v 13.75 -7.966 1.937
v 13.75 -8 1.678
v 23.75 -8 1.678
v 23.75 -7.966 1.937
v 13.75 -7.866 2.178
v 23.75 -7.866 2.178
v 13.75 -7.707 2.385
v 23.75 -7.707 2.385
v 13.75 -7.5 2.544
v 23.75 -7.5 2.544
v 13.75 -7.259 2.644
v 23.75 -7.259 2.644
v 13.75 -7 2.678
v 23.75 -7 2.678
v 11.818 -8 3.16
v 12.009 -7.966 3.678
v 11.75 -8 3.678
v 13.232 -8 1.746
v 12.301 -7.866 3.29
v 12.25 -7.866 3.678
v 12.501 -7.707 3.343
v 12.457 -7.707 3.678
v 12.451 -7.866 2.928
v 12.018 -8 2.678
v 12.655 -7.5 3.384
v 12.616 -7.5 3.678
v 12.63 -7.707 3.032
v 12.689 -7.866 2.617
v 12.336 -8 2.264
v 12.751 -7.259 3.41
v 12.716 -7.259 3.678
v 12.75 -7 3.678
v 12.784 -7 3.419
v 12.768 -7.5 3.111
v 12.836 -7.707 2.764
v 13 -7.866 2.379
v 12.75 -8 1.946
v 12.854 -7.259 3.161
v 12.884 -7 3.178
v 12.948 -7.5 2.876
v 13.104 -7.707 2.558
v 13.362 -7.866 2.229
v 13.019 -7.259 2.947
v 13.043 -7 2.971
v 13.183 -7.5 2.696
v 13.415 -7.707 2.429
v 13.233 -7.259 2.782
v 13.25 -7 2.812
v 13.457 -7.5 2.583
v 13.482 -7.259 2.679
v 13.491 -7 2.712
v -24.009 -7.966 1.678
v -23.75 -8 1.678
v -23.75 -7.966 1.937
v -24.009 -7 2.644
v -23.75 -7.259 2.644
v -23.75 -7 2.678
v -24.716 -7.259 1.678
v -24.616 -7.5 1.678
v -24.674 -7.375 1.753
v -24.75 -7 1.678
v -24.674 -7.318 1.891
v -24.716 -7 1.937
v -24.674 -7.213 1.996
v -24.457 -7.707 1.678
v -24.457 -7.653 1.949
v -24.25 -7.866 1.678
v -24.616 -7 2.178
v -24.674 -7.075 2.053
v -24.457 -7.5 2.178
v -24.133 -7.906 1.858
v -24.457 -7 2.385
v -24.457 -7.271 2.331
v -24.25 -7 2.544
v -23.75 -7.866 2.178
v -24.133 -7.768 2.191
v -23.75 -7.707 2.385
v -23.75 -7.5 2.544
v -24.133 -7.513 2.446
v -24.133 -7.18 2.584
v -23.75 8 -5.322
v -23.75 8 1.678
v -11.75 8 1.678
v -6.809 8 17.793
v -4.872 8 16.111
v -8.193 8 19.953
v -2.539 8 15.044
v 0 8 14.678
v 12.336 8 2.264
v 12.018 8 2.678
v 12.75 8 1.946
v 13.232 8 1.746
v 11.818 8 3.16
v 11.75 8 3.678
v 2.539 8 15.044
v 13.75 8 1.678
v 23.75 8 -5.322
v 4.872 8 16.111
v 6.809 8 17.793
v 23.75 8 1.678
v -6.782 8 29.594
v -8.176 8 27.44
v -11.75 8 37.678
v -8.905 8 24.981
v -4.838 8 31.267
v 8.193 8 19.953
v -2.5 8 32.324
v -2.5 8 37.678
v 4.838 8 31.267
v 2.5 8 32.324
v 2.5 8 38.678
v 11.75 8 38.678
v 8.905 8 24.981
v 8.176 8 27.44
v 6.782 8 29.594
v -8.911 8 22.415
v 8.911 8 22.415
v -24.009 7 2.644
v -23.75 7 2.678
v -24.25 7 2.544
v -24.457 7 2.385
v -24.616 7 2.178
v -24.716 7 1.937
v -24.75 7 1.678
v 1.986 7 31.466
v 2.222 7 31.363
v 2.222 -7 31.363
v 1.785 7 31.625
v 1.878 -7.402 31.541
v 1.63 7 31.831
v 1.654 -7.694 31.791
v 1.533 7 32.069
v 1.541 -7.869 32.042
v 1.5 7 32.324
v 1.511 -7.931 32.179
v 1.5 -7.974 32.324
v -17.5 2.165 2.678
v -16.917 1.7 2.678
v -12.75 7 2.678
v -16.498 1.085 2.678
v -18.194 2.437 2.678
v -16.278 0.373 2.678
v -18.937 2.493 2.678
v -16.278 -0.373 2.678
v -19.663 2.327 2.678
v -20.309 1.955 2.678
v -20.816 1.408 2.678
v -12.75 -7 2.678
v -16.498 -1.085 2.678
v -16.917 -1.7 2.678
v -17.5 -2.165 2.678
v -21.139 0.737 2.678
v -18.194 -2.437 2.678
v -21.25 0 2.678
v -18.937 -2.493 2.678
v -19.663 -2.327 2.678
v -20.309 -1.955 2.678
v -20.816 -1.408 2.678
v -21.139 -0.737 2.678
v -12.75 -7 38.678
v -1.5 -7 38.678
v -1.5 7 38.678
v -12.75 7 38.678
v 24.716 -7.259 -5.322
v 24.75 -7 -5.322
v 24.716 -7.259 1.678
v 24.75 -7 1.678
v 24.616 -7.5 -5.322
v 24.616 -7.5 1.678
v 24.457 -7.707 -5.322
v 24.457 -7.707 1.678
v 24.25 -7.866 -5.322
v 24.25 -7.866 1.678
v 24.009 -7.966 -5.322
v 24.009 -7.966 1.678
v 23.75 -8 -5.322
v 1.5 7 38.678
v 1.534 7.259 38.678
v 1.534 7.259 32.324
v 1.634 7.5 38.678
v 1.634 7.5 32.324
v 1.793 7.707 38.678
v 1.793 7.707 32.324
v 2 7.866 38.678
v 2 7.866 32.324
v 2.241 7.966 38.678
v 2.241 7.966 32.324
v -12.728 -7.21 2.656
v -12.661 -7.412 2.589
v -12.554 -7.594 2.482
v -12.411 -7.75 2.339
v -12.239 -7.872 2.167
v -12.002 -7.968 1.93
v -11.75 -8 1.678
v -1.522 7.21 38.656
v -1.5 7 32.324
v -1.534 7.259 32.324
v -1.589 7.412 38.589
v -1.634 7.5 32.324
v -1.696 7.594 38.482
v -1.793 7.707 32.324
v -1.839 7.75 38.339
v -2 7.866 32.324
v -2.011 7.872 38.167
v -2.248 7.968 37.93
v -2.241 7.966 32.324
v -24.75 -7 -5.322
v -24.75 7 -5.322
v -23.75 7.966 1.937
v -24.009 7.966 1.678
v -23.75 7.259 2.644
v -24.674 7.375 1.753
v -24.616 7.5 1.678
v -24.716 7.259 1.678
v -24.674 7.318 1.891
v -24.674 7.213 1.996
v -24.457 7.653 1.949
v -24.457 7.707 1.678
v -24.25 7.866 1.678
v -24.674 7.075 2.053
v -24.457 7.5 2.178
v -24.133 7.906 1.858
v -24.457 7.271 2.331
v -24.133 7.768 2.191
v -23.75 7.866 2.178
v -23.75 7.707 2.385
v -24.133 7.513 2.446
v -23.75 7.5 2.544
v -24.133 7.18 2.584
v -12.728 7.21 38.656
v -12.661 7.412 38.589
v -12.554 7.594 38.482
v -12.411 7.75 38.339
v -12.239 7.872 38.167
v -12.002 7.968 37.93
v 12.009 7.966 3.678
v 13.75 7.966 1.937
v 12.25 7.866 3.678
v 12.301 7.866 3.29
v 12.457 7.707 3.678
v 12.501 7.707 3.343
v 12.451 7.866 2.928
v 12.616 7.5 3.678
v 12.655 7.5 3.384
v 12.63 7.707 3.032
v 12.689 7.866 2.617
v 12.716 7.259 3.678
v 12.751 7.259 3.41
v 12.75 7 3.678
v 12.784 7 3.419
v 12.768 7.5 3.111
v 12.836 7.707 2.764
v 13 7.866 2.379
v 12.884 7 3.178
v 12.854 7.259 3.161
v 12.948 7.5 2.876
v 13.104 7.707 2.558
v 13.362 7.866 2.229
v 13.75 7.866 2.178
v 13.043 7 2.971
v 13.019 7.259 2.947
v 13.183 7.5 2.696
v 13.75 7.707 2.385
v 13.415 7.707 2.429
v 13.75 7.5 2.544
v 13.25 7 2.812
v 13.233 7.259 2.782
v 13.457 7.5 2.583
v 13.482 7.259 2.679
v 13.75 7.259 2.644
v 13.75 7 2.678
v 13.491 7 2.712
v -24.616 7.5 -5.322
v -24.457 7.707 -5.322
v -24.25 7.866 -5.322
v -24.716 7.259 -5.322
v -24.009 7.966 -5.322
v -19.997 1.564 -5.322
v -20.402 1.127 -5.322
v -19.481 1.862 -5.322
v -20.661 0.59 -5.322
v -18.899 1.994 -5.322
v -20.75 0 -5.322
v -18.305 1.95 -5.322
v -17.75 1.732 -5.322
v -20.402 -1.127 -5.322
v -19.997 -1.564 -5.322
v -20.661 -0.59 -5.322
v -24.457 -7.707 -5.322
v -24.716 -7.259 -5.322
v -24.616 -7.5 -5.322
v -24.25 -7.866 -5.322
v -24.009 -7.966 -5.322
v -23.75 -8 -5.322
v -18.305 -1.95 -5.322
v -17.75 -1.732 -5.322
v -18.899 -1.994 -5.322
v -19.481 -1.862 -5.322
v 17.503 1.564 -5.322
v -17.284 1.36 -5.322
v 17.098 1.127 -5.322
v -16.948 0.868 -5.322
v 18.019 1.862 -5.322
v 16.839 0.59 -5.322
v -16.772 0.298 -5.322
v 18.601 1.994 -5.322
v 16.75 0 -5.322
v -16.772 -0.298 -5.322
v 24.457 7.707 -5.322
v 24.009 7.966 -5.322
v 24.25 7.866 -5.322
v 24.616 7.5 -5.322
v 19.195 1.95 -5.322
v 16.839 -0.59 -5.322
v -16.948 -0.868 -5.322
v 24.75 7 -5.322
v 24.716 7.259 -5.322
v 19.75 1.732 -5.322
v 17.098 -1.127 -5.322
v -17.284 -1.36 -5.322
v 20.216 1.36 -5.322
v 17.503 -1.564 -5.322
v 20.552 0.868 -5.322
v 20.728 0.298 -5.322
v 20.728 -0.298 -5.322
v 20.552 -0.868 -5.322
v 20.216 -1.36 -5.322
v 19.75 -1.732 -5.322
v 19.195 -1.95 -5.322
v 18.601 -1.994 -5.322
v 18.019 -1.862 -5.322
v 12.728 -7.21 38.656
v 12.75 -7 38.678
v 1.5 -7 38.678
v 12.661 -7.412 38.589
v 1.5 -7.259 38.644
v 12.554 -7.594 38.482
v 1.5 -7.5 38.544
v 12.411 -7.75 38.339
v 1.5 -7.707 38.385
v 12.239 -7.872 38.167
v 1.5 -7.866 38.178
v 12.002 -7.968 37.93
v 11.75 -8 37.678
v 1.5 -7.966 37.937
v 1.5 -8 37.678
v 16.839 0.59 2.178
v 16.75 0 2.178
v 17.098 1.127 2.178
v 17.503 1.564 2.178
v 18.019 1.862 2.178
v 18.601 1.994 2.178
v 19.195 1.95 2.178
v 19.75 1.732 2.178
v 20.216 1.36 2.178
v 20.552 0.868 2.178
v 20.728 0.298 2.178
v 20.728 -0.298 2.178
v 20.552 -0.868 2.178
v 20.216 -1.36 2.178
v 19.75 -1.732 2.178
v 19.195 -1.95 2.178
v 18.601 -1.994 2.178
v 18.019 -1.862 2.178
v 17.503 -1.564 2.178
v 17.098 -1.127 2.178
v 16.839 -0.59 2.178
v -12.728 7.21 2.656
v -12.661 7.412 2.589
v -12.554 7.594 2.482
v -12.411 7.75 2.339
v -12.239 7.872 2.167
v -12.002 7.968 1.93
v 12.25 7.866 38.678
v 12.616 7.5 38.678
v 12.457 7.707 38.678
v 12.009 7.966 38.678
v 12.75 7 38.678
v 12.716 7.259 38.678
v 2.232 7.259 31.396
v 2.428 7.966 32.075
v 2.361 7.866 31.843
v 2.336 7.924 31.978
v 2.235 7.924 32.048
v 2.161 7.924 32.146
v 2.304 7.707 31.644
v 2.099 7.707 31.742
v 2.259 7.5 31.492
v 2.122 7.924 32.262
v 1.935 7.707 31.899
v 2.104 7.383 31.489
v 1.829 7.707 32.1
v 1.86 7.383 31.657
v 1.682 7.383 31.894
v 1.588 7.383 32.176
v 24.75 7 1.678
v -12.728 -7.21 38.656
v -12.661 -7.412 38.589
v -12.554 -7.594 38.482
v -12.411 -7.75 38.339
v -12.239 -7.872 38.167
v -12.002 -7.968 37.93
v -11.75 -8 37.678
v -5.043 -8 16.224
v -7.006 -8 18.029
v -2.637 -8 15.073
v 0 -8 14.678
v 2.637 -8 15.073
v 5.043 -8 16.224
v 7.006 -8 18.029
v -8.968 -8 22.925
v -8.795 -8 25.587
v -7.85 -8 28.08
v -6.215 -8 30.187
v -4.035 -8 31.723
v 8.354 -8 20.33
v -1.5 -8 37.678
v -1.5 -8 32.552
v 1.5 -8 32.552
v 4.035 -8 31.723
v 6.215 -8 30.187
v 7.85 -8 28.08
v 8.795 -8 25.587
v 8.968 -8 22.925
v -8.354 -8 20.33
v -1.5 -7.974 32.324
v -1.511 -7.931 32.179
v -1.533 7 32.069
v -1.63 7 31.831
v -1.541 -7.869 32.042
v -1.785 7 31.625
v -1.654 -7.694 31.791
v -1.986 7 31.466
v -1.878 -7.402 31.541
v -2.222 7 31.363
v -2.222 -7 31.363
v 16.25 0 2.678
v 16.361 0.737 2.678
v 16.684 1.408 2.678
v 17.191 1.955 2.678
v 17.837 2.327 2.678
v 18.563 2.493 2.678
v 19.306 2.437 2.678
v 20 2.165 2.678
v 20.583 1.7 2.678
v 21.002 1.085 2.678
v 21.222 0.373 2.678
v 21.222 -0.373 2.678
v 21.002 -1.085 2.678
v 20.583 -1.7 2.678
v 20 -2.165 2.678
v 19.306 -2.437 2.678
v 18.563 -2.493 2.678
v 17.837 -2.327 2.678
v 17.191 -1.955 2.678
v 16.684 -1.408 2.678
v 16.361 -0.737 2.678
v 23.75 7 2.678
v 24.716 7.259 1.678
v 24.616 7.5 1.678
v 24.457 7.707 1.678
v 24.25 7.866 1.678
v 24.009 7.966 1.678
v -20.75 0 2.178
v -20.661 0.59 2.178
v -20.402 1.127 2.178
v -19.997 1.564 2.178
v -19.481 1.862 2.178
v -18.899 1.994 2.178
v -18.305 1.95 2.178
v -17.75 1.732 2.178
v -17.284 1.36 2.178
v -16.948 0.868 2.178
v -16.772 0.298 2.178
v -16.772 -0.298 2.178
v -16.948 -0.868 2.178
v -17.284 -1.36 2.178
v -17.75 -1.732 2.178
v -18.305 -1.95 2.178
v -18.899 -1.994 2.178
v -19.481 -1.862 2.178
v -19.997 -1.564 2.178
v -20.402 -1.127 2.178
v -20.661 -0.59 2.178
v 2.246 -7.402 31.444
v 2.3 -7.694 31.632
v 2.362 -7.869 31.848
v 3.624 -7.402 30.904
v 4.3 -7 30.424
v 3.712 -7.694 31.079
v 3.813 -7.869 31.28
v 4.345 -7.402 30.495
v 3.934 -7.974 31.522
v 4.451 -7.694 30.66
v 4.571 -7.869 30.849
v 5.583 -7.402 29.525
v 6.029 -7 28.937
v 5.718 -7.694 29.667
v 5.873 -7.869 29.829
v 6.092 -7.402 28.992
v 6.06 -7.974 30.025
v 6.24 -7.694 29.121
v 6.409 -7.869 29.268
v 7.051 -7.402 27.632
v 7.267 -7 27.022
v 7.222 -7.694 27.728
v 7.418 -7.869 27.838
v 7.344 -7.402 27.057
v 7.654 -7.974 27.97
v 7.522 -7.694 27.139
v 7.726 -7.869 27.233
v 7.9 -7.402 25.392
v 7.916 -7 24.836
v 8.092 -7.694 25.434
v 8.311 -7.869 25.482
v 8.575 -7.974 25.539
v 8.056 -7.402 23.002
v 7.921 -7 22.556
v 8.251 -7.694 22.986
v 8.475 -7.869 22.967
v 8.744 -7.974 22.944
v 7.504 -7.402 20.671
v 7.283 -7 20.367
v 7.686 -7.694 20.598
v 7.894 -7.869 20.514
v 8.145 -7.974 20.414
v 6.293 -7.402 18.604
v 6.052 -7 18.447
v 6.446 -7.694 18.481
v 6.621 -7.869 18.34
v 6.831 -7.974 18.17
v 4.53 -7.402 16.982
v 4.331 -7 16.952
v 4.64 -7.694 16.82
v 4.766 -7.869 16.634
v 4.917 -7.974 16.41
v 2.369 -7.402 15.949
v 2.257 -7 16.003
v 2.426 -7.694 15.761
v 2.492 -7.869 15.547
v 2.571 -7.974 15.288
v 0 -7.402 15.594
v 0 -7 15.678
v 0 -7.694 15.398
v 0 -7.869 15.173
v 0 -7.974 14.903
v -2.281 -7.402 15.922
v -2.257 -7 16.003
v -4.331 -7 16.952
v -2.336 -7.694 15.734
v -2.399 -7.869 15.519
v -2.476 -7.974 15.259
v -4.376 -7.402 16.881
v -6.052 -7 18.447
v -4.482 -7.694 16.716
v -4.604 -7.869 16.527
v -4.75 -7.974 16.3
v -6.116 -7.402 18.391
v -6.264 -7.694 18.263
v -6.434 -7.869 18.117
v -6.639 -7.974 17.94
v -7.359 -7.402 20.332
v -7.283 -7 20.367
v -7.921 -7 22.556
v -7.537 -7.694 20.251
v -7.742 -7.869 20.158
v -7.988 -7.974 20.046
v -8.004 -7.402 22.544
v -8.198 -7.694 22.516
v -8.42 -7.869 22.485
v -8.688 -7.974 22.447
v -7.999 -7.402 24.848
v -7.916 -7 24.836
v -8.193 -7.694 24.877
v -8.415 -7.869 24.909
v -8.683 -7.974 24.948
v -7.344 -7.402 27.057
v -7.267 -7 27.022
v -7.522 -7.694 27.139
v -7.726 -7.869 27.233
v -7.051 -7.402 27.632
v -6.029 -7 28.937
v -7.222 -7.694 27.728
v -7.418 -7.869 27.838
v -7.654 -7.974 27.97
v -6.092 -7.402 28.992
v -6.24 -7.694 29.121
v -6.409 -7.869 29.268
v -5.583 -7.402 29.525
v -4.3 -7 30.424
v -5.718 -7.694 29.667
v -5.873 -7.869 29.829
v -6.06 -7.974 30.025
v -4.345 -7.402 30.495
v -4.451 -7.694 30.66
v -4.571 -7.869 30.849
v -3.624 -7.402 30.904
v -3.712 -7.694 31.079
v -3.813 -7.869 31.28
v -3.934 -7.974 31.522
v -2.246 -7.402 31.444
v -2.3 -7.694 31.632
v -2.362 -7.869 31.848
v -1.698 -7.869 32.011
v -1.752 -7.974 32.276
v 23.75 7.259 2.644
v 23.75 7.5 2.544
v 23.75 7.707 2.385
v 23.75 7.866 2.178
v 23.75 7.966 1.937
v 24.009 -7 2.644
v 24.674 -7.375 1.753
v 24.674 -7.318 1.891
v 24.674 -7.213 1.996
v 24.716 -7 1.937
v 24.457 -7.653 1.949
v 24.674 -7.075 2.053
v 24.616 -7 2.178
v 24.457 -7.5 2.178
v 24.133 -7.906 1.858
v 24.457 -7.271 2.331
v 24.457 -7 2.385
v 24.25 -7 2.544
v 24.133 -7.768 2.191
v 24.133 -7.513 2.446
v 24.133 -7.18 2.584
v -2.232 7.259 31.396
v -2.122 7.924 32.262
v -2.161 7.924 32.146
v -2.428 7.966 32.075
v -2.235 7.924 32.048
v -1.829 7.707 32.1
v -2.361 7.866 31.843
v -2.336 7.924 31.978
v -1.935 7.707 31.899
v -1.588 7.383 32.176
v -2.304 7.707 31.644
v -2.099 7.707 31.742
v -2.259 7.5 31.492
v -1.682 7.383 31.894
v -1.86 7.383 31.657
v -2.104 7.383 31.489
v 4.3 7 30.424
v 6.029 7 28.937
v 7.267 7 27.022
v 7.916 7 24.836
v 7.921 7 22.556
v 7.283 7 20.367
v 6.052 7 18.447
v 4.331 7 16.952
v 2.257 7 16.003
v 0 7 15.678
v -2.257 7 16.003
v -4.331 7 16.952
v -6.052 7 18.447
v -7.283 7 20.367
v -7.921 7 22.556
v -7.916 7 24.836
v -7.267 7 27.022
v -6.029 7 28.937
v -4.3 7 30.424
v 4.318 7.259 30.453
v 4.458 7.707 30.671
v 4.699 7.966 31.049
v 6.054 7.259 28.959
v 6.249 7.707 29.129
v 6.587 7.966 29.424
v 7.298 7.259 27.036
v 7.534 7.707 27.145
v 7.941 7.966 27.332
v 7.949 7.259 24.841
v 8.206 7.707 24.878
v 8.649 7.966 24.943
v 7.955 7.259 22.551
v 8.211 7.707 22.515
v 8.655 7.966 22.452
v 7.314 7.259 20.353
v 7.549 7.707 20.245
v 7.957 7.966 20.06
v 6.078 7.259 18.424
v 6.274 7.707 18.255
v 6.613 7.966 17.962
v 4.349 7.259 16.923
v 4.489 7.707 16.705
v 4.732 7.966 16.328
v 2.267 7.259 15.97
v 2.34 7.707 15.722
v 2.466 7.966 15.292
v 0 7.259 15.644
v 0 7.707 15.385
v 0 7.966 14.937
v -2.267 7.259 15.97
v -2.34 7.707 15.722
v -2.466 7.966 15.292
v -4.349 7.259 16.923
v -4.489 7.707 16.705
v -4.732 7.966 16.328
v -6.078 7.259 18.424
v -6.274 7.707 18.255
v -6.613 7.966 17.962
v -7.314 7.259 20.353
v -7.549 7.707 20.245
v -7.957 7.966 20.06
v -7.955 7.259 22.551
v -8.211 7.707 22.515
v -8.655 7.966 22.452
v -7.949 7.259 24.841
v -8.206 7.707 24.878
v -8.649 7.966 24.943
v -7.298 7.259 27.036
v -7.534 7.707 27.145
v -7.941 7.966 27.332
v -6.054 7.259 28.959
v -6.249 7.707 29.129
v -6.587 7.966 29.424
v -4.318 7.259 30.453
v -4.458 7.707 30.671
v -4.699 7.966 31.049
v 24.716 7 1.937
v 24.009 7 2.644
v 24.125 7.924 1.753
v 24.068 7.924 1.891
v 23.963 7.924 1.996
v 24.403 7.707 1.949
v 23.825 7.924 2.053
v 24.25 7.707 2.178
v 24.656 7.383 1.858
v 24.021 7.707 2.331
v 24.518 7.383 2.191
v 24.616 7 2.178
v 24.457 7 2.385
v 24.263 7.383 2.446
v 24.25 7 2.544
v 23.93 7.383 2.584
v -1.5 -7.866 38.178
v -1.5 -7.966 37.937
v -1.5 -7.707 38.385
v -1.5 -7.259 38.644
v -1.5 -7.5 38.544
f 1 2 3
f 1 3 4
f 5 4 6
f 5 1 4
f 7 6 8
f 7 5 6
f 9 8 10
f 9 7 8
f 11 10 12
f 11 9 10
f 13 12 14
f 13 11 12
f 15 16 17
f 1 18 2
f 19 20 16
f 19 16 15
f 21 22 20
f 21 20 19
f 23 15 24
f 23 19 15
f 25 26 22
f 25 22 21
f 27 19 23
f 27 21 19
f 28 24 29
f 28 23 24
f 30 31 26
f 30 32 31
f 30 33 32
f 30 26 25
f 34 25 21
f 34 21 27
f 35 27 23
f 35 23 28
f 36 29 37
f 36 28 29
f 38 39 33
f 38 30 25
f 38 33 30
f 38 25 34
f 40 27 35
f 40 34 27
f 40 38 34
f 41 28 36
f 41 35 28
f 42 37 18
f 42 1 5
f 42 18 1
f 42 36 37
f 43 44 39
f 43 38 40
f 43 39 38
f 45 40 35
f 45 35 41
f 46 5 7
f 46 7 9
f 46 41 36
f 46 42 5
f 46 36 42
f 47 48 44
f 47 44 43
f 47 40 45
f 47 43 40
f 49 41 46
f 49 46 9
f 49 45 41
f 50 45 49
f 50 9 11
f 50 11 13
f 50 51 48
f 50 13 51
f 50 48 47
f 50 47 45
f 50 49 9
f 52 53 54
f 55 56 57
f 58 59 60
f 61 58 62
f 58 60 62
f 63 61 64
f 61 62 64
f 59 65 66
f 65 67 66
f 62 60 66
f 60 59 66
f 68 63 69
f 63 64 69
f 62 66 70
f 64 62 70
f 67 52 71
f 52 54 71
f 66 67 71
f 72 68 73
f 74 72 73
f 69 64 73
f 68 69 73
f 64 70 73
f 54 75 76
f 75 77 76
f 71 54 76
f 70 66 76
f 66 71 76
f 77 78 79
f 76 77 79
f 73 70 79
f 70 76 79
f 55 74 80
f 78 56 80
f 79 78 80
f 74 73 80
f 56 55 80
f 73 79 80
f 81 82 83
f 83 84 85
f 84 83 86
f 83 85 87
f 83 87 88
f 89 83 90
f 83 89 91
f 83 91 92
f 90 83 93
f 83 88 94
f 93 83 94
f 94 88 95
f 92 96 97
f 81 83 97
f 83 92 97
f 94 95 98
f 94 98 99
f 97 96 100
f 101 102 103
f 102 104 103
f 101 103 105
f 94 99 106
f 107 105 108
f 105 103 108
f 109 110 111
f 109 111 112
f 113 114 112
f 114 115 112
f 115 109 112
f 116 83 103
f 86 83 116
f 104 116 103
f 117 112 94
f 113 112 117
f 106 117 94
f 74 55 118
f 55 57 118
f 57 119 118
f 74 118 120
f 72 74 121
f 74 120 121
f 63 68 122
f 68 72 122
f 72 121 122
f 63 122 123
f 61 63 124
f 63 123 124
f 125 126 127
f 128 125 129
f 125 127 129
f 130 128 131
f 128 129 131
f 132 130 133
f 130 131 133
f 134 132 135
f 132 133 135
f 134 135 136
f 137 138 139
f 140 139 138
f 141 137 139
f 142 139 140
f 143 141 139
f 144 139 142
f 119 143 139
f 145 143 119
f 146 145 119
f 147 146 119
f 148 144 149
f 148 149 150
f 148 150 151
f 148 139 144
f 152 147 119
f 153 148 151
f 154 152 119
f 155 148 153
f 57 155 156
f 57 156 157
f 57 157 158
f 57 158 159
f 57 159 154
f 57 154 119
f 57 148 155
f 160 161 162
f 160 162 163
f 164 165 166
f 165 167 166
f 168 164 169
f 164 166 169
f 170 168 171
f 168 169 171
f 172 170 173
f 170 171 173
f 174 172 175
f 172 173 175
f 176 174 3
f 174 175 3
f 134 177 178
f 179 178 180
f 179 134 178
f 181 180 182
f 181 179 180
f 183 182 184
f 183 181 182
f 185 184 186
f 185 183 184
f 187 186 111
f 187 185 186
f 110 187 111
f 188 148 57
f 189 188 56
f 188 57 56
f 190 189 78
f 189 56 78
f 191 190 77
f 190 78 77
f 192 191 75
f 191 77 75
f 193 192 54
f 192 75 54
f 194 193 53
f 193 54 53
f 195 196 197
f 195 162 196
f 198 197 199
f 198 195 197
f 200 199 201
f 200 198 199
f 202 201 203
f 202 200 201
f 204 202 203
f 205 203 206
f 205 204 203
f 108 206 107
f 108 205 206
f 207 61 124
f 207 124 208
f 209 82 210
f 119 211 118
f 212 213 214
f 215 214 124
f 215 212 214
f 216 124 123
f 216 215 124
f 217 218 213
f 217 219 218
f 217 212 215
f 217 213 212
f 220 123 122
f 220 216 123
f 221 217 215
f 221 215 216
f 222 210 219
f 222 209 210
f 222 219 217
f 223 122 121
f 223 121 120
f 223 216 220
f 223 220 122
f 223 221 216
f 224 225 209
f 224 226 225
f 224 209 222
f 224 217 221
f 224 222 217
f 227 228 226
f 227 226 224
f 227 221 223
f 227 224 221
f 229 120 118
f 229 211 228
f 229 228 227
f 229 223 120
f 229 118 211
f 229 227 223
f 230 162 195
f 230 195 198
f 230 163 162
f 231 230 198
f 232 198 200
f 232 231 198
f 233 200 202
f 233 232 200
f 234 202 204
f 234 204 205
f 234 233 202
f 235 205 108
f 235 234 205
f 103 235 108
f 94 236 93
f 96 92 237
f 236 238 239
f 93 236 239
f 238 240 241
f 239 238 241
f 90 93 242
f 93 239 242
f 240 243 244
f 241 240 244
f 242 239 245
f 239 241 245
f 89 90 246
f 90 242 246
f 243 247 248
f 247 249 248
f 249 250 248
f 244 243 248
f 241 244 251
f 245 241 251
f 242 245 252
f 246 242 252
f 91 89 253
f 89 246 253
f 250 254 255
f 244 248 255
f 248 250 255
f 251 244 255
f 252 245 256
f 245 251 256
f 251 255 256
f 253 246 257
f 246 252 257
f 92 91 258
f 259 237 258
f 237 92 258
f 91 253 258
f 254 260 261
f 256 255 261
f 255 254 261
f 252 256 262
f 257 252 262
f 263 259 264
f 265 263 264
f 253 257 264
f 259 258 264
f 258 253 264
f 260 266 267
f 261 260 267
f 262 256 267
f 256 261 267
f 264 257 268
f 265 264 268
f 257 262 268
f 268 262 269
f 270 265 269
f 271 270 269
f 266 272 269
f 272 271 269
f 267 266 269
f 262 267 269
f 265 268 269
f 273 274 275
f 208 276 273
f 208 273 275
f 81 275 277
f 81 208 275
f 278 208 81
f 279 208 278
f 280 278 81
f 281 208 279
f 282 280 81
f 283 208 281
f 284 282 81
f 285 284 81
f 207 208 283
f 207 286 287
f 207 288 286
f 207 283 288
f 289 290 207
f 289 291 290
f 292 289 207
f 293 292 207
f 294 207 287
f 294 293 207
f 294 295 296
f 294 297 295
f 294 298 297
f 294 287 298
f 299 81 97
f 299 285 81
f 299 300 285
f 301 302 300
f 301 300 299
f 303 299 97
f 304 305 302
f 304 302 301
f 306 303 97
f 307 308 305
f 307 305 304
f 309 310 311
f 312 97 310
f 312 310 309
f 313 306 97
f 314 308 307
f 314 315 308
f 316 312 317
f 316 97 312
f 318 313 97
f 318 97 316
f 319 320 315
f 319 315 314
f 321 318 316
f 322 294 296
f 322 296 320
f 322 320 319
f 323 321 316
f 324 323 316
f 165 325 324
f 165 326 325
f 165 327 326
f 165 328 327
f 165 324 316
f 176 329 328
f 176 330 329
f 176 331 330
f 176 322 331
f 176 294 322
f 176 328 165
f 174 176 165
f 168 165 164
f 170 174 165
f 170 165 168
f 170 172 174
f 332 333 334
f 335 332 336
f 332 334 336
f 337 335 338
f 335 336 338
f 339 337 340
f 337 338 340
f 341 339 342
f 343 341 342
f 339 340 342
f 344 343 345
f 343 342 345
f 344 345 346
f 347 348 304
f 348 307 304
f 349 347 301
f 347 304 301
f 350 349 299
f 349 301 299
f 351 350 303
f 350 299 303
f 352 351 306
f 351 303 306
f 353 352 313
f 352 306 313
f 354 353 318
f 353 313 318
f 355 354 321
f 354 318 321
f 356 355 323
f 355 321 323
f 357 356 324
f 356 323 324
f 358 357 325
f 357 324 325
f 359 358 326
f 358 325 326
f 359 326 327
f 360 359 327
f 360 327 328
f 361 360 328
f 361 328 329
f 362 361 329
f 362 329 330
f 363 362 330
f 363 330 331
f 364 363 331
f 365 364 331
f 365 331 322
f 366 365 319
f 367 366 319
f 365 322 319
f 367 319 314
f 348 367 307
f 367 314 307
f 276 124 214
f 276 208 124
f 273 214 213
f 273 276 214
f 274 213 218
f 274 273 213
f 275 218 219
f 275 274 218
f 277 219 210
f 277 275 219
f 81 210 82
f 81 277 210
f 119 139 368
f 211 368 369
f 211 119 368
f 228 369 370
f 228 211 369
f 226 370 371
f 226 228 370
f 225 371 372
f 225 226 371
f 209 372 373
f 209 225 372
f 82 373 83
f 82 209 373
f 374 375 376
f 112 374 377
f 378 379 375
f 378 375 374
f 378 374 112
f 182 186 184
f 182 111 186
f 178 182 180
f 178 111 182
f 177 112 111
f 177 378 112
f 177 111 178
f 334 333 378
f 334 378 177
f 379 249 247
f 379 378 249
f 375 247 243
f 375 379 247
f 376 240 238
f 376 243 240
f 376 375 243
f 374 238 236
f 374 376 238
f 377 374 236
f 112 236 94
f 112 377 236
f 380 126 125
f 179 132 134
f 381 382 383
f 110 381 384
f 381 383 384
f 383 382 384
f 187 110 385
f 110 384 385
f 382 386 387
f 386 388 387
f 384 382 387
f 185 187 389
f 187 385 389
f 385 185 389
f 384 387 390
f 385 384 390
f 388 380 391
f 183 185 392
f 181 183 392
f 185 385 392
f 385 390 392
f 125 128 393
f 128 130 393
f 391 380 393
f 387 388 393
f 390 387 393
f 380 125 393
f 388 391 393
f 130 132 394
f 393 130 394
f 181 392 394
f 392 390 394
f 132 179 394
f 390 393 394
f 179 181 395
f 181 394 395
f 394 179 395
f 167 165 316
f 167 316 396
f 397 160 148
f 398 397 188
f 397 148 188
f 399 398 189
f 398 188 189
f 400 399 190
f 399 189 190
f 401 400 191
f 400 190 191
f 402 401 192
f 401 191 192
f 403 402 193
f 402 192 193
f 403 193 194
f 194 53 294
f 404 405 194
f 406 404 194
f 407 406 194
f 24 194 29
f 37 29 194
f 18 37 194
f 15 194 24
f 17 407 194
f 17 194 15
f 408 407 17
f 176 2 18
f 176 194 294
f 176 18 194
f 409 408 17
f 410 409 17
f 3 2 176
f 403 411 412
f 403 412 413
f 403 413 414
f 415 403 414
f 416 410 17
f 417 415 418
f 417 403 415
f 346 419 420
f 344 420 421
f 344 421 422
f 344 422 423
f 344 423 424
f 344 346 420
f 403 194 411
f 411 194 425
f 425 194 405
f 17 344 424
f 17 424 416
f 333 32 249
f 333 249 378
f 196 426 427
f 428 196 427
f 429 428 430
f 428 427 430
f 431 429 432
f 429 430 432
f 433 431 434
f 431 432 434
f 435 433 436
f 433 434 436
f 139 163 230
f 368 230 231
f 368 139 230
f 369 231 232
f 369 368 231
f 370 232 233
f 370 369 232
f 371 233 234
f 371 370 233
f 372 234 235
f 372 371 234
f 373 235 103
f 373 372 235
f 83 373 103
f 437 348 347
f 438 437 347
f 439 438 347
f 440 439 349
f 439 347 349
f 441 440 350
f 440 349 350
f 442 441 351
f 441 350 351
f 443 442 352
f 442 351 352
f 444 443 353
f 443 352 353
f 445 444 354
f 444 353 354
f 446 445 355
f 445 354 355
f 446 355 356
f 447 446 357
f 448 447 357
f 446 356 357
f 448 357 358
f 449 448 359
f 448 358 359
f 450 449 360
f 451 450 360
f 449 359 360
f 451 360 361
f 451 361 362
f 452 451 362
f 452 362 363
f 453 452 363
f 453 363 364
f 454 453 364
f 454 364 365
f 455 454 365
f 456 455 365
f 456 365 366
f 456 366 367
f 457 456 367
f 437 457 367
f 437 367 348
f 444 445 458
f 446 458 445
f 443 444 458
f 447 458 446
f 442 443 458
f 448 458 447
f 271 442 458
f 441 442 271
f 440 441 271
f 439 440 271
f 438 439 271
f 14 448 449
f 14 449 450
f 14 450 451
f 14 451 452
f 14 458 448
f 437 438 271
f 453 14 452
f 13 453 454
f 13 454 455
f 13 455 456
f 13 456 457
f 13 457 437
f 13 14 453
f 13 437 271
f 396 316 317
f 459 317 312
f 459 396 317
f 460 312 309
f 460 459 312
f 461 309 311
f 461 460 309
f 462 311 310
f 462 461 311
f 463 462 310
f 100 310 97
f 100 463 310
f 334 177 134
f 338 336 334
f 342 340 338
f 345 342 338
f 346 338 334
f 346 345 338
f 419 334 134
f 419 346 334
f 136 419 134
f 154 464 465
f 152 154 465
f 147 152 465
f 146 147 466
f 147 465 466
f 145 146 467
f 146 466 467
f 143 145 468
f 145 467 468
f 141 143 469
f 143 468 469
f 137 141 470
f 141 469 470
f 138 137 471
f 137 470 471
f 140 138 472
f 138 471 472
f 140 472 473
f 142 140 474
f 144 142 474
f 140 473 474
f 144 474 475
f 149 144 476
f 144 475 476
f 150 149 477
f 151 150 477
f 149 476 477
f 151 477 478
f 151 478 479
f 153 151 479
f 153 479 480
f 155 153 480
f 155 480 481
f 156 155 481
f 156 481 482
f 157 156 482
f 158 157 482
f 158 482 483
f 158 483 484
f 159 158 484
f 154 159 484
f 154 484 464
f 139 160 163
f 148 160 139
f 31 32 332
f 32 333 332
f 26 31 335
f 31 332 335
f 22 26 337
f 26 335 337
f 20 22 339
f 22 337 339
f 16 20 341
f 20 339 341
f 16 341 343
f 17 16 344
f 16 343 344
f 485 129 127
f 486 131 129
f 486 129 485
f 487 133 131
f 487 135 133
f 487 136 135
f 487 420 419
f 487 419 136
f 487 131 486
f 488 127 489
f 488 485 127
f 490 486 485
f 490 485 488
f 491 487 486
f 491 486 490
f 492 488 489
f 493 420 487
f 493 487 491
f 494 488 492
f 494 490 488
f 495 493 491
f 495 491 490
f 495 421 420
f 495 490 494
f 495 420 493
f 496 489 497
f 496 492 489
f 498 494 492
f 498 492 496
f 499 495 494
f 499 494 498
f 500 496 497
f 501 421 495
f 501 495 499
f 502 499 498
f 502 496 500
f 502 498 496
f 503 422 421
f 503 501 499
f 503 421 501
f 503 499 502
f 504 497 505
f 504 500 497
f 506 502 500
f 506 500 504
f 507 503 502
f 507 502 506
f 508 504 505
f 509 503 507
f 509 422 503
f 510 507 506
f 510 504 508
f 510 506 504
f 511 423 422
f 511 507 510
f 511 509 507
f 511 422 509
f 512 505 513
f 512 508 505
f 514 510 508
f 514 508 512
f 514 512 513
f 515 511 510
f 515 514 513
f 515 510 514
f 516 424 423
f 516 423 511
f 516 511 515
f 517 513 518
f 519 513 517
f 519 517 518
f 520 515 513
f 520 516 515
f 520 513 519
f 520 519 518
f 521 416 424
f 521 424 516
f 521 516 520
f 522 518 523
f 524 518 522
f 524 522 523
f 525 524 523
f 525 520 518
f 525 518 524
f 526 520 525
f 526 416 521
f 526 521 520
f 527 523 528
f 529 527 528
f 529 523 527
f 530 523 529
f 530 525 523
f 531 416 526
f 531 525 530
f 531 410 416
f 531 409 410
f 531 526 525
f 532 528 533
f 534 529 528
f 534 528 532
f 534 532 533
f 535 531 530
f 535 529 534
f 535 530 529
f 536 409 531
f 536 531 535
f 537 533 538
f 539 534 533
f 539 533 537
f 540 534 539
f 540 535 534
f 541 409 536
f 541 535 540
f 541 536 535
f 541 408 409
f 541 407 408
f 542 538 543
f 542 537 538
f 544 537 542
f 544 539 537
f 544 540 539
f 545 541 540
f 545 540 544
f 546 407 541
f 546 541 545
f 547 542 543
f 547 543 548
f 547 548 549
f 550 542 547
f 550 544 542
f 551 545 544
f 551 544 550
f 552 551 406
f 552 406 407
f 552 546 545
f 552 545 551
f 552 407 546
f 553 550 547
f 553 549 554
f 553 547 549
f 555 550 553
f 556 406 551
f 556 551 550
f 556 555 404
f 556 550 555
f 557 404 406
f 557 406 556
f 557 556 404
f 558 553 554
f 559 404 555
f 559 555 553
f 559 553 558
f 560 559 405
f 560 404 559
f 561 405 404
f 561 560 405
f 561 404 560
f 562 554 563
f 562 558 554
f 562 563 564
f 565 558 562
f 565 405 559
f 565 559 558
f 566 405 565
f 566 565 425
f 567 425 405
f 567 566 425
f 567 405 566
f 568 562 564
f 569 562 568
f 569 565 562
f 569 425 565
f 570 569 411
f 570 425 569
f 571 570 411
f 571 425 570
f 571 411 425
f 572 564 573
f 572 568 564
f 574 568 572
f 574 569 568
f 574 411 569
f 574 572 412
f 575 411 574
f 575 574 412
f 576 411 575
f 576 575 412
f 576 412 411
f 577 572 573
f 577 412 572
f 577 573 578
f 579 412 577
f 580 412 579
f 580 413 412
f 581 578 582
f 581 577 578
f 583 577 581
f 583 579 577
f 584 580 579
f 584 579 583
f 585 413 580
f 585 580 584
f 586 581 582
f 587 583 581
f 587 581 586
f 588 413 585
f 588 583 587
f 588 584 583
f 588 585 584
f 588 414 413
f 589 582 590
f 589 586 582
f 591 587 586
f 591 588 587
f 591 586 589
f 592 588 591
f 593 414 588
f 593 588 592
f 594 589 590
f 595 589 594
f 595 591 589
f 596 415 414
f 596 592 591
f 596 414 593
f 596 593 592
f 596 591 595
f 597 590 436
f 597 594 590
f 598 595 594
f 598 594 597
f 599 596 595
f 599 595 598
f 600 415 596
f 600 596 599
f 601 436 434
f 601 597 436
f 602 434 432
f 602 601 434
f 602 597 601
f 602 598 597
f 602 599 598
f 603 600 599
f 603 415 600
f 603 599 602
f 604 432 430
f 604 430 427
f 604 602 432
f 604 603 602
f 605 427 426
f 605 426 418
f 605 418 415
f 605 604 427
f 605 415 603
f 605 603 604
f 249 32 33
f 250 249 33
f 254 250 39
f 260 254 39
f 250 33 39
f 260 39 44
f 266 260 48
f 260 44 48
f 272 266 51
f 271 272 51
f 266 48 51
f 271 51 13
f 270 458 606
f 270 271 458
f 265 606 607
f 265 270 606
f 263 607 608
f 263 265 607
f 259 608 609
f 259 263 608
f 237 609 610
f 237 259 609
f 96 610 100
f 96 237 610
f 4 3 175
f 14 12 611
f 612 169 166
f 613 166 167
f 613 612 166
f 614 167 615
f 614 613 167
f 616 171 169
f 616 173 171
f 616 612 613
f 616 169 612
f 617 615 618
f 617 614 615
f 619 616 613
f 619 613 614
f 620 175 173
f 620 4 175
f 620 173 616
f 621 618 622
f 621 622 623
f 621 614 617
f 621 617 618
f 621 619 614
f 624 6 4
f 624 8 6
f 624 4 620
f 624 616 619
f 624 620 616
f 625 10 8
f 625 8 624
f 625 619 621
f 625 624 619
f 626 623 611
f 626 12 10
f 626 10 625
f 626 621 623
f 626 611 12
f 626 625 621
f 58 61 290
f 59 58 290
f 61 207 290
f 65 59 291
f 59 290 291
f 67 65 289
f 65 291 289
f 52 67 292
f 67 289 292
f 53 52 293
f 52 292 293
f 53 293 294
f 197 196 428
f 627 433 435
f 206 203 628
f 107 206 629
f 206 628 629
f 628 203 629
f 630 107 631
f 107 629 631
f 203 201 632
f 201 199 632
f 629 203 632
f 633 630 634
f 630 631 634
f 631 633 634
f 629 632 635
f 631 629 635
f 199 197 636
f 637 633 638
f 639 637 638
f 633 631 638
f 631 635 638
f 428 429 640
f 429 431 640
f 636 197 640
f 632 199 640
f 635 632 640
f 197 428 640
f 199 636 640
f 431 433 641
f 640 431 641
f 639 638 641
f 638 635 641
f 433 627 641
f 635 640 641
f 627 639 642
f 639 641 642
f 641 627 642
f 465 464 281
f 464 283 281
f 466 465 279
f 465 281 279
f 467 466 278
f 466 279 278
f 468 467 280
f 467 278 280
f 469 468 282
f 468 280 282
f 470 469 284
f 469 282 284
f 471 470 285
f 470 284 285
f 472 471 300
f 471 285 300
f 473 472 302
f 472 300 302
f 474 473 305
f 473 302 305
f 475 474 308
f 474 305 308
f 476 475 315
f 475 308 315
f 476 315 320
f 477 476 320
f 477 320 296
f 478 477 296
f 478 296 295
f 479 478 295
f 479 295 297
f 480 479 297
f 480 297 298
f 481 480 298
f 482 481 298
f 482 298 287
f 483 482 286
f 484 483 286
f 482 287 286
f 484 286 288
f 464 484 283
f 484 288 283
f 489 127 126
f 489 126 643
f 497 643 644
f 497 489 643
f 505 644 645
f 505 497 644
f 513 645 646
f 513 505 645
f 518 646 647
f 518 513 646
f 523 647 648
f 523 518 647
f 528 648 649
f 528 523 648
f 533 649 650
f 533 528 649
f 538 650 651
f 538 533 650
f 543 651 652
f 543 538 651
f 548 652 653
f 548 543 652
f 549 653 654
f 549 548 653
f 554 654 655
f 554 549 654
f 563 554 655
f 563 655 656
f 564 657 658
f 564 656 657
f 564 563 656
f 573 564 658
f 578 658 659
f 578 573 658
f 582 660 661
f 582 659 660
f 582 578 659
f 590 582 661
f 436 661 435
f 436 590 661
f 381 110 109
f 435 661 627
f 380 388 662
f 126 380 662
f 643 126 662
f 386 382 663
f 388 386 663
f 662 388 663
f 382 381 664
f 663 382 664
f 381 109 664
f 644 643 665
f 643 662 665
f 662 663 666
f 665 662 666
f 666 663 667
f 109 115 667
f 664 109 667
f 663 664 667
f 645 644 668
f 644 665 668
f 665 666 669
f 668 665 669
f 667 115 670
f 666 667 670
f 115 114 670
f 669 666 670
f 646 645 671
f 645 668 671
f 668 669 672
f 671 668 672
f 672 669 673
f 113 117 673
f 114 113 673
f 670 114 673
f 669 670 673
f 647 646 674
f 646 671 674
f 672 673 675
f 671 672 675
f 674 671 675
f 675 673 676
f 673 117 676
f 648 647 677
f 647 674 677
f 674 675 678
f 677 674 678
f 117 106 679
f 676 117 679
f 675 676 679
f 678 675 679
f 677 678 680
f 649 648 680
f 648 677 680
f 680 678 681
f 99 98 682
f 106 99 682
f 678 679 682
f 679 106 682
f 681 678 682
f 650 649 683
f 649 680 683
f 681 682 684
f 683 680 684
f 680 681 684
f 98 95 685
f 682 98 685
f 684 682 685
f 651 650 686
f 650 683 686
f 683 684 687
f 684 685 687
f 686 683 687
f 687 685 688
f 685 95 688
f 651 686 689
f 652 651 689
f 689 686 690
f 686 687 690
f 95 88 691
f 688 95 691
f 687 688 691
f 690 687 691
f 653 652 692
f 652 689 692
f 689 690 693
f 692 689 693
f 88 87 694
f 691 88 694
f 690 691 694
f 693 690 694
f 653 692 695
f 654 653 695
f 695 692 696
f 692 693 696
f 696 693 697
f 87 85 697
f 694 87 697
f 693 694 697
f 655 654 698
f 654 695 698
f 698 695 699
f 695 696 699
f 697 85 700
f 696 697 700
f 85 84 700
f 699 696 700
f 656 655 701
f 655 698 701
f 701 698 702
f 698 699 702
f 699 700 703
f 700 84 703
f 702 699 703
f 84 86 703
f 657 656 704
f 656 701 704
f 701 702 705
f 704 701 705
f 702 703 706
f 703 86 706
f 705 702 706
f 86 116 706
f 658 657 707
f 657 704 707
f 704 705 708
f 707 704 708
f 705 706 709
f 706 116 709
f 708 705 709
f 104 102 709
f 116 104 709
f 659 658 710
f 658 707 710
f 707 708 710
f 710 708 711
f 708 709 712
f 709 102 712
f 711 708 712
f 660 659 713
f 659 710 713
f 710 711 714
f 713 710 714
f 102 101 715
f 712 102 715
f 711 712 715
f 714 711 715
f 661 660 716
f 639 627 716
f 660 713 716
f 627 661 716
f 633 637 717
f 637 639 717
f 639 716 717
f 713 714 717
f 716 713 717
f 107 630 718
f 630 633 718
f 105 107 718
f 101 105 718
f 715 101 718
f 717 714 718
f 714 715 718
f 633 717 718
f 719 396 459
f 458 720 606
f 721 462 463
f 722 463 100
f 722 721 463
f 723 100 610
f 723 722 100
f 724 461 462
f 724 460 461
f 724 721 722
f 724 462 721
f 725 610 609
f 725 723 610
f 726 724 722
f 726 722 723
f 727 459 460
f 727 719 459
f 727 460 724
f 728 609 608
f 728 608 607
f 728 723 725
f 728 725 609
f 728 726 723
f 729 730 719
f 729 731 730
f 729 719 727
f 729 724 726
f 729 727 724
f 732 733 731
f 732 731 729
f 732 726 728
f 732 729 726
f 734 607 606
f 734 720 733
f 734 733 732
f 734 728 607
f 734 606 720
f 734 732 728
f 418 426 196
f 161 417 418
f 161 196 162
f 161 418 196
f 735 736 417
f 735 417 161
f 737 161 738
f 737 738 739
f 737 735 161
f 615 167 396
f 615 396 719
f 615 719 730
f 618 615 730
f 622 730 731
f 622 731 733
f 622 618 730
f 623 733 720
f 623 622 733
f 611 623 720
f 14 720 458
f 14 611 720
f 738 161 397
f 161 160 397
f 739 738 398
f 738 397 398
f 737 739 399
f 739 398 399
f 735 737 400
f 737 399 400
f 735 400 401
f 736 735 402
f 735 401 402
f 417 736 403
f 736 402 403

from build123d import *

# Parameters (mm, degrees)
F1_DEPTH       = 8
F3_D           = 4
F3_CSINK_D     = 5
F3_CSINK_ANGLE = 90
F4_R           = 1


with BuildPart() as f1:
    # F0 (on Front) → F1 (new body, symmetric)
    with BuildSketch(Plane.XZ):
        with BuildLine():
            Line((0, -5.3220339234), (24.75, -5.3220339234))
            Line((24.75, -5.3220339234), (24.75, 2.6779660766))
            Line((24.75, 2.6779660766), (12.75, 2.6779660766))
            Line((12.75, 2.6779660766), (12.75, 38.6779660766))
            Line((12.75, 38.6779660766), (1.5, 38.6779660766))
            Line((1.5, 38.6779660766), (1.5, 31.5360828994))
            ThreePointArc((1.5, 31.5360828994), (7.964450219, 22.9246184085), (0, 15.6779660766))
            Line((0, 15.6779660766), (0, -5.3220339234))
        make_face()
        with BuildLine():
            Line((-24.75, -5.3220339234), (0, -5.3220339234))
            Line((0, -5.3220339234), (0, 15.6779660766))
            ThreePointArc((0, 15.6779660766), (-7.964450219, 22.9246184085), (-1.5, 31.5360828994))
            Line((-1.5, 31.5360828994), (-1.5, 38.6779660766))
            Line((-1.5, 38.6779660766), (-12.75, 38.6779660766))
            Line((-12.75, 38.6779660766), (-12.75, 2.6779660766))
            Line((-12.75, 2.6779660766), (-24.75, 2.6779660766))
            Line((-24.75, 2.6779660766), (-24.75, -5.3220339234))
        make_face()
    extrude(amount=F1_DEPTH, both=True)

    # F3 (through all)
    with Locations(Plane.XY.offset(2.6779660766)):
        with Locations((18.75, 0), (-18.75, 0)):
            CounterSinkHole(F3_D / 2, F3_CSINK_D / 2, counter_sink_angle=F3_CSINK_ANGLE)

    # F4
    f4_edges = [f1.edges().sort_by_distance(p)[0] for p in [
        (-12.75, -8, 20.677966),
        (-7.125, -8, 38.677966),
        (7.125, -8, 38.677966),
        (12.75, -8, 20.677966),
        (18.75, -8, 2.677966),
        (-18.75, -8, 2.677966),
        (24.75, -8, -1.322034),
        (-24.75, -8, -1.322034),
        (12.75, 0, 2.677966),
        (24.75, 0, 2.677966),
        (24.75, 8, -1.322034),
        (12.75, 8, 20.677966),
        (1.5, 8, 35.107024),
        (-1.5, 8, 35.107024),
        (1.5, 0, 31.536083),
        (0, 8, 15.677966),
        (-1.5, 0, 31.536083),
        (0, -8, 15.677966),
        (-7.125, 8, 38.677966),
        (-12.75, 8, 20.677966),
        (-18.75, 8, 2.677966),
        (-24.75, 8, -1.322034),
        (-24.75, 0, 2.677966),
        (18.75, 8, 2.677966),
    ]]
    fillet(f4_edges, radius=F4_R)


solid = f1.part
